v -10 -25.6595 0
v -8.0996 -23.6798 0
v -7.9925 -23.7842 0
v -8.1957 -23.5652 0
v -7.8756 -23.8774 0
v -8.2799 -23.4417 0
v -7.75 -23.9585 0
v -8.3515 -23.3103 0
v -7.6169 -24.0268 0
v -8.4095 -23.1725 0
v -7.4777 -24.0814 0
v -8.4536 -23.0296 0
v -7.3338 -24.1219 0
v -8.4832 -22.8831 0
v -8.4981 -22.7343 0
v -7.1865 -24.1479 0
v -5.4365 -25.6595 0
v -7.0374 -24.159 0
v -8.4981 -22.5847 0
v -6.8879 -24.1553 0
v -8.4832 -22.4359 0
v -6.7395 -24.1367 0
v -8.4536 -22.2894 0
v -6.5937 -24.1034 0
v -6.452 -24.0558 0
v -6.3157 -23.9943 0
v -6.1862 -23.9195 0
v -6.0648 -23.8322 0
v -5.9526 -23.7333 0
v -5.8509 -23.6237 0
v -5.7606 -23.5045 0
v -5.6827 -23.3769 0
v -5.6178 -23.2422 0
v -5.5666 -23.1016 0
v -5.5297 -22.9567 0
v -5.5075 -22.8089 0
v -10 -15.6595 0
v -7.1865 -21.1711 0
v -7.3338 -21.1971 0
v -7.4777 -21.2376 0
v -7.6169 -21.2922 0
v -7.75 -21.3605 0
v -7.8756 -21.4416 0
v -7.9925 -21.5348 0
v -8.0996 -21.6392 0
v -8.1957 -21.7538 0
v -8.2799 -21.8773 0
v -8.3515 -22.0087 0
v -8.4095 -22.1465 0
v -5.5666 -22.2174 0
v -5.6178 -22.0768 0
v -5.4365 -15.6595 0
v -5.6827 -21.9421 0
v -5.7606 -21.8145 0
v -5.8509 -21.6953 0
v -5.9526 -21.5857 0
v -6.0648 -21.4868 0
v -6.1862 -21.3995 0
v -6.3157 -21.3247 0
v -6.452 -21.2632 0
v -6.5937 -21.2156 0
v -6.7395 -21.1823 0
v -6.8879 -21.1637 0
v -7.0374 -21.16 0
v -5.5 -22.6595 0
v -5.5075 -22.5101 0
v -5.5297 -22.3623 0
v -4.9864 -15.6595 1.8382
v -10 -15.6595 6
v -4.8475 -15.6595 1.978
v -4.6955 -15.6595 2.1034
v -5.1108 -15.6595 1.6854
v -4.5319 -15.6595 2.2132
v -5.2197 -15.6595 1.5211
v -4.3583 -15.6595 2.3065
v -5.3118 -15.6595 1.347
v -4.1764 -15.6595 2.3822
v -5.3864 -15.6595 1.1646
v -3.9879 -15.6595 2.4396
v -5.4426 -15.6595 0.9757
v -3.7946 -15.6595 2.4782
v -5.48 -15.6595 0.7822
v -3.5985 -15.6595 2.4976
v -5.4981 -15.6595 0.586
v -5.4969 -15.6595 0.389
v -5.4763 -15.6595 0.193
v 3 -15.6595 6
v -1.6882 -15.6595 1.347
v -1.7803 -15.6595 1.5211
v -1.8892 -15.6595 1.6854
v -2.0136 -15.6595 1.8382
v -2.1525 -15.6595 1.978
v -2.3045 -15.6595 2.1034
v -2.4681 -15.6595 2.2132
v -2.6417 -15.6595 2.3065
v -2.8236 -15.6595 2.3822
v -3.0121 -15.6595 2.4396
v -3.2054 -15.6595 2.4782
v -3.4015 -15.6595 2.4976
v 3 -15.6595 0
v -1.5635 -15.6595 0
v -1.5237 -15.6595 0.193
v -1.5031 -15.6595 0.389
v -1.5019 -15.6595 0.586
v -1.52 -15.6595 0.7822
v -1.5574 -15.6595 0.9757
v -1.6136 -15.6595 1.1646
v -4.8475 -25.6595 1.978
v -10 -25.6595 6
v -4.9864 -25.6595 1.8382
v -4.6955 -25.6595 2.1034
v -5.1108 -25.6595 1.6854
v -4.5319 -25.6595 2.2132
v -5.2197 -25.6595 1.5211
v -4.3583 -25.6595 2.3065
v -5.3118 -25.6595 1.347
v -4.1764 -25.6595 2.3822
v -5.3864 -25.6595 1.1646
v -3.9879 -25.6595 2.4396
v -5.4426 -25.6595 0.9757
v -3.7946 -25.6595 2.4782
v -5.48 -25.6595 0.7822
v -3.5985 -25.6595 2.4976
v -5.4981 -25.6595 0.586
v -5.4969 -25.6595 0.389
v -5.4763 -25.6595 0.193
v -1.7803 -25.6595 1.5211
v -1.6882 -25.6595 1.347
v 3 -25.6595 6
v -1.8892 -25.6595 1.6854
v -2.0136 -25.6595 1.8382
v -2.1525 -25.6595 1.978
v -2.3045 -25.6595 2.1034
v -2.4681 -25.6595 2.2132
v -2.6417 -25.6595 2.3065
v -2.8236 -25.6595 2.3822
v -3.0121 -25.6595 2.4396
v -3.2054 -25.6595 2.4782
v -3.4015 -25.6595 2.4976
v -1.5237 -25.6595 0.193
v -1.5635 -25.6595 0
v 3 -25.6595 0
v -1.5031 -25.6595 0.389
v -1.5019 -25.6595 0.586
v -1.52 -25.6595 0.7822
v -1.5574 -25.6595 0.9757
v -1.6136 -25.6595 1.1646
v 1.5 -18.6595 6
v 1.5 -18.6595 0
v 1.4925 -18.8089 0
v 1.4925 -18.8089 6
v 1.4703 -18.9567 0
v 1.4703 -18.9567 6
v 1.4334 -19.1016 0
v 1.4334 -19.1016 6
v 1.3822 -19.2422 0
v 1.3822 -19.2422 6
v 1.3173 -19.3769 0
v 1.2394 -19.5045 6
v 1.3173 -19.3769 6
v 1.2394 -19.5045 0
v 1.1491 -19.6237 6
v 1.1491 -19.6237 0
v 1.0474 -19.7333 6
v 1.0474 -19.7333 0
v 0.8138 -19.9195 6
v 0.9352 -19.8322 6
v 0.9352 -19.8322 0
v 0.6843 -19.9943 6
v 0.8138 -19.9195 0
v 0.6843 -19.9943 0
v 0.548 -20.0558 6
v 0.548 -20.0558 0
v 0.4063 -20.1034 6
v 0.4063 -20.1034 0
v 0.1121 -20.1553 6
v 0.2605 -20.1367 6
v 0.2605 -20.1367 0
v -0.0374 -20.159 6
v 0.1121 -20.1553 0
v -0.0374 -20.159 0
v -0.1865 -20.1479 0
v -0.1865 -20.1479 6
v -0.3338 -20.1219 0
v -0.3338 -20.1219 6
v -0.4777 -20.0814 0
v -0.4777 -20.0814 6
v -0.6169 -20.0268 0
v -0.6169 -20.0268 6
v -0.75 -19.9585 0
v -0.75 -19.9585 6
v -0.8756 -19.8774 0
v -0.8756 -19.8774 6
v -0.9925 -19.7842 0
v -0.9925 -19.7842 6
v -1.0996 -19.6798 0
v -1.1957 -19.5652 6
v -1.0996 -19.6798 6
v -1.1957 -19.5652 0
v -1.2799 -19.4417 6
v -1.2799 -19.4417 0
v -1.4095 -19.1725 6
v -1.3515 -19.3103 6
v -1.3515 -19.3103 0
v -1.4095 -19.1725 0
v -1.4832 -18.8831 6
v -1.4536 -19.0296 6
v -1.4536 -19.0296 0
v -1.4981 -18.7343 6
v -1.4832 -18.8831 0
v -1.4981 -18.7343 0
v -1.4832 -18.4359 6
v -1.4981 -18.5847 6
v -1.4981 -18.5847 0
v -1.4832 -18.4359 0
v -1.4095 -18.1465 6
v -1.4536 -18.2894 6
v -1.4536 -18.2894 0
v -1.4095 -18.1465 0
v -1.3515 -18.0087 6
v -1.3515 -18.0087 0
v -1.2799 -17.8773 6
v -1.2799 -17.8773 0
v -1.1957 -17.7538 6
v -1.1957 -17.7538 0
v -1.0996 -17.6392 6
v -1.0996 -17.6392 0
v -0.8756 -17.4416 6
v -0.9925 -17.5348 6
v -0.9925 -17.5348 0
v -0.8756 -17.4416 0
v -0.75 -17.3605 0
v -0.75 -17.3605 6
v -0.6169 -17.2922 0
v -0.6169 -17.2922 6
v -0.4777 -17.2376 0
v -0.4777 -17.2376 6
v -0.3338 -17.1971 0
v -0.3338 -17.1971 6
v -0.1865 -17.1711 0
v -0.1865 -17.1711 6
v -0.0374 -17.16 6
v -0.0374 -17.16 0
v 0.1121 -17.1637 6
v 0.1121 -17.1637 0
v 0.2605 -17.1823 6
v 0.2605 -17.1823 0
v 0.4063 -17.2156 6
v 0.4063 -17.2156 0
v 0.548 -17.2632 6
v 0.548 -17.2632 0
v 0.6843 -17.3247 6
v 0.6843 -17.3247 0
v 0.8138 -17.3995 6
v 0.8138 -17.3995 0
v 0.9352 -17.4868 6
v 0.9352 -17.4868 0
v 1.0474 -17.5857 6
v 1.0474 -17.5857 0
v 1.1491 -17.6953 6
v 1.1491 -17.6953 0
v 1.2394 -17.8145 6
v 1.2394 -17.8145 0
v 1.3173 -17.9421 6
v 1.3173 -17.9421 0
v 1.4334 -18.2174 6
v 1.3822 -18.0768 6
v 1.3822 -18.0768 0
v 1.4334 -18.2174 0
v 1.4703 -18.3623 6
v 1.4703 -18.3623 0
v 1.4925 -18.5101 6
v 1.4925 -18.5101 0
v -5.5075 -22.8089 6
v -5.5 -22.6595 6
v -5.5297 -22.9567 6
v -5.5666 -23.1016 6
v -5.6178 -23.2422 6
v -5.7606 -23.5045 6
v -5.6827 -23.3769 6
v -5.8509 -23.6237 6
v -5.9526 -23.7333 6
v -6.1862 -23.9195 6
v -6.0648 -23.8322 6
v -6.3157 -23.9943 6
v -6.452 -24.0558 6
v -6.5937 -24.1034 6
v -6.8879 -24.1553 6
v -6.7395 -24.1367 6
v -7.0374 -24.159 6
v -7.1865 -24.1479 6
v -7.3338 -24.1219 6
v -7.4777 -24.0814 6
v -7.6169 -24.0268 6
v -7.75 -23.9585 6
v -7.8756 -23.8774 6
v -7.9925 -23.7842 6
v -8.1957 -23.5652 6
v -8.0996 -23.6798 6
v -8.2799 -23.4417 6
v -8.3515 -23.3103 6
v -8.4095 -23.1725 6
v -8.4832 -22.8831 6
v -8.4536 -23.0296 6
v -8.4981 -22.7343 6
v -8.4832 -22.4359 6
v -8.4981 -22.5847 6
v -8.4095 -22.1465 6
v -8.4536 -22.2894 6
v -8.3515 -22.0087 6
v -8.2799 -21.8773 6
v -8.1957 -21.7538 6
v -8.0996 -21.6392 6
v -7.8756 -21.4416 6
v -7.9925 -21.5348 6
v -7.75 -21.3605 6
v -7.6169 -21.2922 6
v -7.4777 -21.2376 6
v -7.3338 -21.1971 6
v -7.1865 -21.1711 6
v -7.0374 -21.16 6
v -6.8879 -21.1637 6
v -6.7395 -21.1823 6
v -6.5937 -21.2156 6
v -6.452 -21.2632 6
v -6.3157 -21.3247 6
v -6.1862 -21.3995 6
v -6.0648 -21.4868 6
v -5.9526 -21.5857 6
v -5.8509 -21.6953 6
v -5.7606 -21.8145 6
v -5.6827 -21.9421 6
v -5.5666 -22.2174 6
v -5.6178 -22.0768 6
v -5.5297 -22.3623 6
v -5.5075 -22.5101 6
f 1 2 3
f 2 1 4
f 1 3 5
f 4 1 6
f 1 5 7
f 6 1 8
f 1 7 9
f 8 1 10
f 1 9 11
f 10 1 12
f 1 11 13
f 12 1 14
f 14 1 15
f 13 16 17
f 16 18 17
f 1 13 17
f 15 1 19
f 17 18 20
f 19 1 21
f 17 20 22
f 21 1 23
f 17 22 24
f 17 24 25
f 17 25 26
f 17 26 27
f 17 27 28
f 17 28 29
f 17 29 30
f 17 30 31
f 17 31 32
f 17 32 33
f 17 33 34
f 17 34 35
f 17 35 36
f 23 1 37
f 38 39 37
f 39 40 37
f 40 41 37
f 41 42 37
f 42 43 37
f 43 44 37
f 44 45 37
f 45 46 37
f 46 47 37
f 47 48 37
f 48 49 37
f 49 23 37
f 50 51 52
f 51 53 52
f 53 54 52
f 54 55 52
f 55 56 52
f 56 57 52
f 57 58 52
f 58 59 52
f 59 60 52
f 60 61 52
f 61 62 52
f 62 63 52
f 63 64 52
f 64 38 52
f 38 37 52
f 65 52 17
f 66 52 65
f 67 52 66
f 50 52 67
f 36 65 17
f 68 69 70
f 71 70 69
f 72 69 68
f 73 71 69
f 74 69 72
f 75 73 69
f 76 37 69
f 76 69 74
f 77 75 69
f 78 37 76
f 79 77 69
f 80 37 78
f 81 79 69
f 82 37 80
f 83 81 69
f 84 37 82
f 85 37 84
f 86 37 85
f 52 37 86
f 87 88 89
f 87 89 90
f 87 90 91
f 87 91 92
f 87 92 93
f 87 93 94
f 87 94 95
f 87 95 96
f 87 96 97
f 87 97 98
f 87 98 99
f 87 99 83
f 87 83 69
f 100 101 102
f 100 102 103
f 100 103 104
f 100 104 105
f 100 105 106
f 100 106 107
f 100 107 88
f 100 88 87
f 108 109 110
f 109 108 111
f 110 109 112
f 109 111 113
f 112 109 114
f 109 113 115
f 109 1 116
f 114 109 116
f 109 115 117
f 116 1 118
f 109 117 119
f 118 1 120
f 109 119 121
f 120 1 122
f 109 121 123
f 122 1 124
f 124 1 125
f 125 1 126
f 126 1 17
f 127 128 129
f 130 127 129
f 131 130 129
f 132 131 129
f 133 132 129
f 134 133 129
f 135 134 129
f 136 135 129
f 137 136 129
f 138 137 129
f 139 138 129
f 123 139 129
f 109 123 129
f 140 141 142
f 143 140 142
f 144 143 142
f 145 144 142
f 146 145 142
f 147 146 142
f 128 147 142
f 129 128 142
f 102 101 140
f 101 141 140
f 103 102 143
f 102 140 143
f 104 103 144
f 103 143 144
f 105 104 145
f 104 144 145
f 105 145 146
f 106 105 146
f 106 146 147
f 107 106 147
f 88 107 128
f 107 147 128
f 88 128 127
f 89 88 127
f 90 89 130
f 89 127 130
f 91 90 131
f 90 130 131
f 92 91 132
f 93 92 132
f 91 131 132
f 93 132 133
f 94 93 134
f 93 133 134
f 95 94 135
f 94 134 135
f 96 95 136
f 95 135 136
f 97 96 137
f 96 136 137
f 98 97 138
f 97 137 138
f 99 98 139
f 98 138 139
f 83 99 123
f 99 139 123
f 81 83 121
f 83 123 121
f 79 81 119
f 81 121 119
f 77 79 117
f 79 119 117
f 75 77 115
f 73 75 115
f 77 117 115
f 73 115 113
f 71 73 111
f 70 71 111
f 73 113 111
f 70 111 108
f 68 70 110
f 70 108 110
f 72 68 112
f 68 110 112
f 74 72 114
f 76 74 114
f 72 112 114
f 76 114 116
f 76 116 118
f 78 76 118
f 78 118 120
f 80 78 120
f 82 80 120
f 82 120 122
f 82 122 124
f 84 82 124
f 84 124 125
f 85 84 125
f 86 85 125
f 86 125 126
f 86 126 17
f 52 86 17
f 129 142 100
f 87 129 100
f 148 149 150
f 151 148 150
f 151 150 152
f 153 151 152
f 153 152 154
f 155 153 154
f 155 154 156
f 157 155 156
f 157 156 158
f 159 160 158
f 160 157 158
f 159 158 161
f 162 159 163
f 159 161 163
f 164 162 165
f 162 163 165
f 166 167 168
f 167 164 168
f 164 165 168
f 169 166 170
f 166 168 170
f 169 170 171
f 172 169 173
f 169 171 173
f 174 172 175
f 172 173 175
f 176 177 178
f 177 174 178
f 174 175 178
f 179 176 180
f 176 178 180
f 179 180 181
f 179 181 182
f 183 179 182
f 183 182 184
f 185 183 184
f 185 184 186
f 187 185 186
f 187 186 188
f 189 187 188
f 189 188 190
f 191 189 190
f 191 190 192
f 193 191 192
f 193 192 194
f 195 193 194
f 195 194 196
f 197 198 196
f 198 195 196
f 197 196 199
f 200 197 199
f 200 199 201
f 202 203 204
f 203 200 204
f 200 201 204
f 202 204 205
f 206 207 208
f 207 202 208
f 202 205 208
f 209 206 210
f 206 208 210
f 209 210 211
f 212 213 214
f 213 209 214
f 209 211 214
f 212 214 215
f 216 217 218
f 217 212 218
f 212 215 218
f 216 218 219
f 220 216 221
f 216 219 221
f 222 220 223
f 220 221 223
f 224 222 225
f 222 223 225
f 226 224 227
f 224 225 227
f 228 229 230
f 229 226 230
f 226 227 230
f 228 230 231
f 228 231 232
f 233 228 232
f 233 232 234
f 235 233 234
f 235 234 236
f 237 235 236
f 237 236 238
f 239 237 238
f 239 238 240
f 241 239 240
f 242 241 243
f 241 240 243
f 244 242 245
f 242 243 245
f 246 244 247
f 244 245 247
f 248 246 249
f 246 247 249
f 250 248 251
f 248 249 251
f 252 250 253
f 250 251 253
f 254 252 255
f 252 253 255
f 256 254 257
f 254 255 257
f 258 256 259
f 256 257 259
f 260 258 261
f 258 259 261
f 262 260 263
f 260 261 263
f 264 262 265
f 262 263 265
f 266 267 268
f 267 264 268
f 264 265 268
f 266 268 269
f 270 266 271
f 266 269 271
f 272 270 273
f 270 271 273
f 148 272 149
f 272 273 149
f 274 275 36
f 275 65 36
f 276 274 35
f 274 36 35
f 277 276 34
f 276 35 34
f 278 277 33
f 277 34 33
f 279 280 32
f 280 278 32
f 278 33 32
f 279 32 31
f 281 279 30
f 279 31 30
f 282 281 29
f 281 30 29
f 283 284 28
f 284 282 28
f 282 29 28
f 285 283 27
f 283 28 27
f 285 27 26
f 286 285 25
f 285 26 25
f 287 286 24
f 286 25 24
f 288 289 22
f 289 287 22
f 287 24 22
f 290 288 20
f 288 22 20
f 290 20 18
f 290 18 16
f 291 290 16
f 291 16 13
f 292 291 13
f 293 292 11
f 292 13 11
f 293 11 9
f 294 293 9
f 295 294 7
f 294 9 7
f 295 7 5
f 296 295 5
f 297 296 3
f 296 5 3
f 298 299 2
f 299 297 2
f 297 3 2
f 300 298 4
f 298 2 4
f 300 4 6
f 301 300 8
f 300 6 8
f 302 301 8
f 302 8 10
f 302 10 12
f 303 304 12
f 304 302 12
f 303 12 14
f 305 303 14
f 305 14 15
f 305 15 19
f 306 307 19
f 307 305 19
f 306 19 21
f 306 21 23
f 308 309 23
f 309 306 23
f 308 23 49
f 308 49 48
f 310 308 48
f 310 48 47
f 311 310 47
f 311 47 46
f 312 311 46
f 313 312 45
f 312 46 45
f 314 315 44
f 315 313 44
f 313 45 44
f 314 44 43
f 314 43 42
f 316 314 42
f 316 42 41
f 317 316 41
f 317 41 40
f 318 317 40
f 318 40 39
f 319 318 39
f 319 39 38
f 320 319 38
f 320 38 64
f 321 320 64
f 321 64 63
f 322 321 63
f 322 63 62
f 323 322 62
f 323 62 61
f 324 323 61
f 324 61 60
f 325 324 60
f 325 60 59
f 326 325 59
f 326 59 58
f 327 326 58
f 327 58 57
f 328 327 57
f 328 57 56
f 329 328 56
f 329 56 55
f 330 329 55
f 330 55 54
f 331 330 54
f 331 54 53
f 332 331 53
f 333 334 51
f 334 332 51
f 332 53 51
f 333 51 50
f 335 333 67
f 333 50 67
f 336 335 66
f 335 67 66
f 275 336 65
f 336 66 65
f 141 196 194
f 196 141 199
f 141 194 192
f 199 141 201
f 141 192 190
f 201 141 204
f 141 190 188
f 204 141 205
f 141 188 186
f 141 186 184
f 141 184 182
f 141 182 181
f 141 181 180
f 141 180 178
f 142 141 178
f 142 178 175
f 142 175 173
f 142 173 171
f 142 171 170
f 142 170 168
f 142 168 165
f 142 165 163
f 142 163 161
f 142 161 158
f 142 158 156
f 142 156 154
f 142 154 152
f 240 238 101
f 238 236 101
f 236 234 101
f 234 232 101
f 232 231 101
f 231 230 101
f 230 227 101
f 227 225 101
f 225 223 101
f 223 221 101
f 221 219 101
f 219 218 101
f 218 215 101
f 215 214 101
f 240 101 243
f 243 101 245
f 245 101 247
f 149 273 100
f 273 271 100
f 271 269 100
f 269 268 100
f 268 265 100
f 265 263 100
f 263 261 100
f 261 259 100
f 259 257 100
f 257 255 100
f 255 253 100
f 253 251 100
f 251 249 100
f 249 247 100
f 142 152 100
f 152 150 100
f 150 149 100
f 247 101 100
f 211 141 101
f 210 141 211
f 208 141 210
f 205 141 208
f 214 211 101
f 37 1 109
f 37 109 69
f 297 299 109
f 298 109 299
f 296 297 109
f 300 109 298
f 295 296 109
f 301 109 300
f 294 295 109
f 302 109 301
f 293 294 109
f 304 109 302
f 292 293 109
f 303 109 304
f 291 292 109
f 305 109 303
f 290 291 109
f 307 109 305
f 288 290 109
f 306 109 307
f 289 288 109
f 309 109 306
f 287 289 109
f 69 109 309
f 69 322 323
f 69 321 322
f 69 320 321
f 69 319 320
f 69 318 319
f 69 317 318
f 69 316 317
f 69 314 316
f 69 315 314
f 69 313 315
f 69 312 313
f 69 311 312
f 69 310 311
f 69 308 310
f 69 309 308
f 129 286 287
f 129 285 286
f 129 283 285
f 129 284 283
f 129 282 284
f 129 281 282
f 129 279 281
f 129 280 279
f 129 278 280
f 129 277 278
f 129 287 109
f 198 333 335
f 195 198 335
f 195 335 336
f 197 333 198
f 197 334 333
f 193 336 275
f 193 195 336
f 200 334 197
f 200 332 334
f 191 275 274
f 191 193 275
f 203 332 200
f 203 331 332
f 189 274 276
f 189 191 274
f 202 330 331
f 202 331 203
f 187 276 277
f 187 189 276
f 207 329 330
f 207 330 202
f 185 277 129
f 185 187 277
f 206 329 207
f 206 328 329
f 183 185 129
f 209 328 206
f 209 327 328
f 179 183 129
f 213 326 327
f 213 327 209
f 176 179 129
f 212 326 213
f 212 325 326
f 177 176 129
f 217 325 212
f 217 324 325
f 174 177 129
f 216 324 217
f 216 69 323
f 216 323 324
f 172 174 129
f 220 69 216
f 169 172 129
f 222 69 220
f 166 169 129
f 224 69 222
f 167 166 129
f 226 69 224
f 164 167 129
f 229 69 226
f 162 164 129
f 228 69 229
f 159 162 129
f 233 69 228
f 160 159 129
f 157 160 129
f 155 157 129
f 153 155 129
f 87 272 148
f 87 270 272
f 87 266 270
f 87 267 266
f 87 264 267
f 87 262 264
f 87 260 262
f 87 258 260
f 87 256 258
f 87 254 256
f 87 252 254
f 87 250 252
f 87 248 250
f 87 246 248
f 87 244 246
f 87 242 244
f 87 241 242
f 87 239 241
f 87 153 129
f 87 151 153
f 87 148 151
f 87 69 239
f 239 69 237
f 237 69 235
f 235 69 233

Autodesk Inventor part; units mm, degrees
ref_plane "YZ Plane" through (0, 0, 0) normal (1, 0, 0) x (0, 1, 0)
ref_plane "XZ Plane" through (0, 0, 0) normal (0, 1, 0) x (-1, 0, 0)
ref_plane "XY Plane" through (0, 0, 0) normal (0, 0, 1) x (1, 0, 0)
sketch "Sketch1" plane through (0, 0, 0) normal (0, 0, 1) x (1, 0, 0)
  line L0 (-1.7679, 0.1299) -> (-1.7679, -25.6595) projected
  line L1 (-1.7679, -25.6595) -> (3, -25.6595) projected
  line L2 (3, -25.6595) -> (3, -15.6595) projected
  line L3 (3, -15.6595) -> (0, -15.6595) projected
  line L4 (0, -15.6595) -> (0, 0.1299) projected
  line L5 (-1.7679, 0.1299) -> (0, 0.1299) projected
  circle A0 centre (0, -18.6595) radius 1.5 projected
  line L6 (-5.2321, -25.6595) -> (-5.2321, 0.1299) projected
  line L7 (-10, 0.1299) -> (-5.2321, 0.1299) projected
  line L8 (-10, -25.6595) -> (-10, 0.1299) projected
  line L9 (-10, -25.6595) -> (-5.2321, -25.6595) projected
  circle A1 centre (-7, -22.6595) radius 1.5 projected
  line L10 (3, -25.6595) -> (-10, -25.6595)
  line L11 (-10, -25.6595) -> (-10, -15.6595)
  line L12 (-10, -15.6595) -> (3, -15.6595)
  line L13 (3, -15.6595) -> (3, -25.6595)
  point P0 (0, 0)
extrude "Extrusion1" add sketch "Sketch1" along normal blind 6 contours L12 L3 L2 L1 L0 | L0 L10 L6 L12 | L6 L9 L8 L12
sketch "Sketch2" plane through (-10, -25.6595, 0) normal (0, -1, 0) x (1, 0, 0)
  line L0 (0, 0) -> (13, 0) projected
  line L1 (13, 0) -> (13, 6) projected
  line L2 (0, 6) -> (13, 6) projected
  line L3 (0, 0) -> (0, 6) projected
  arc A0 (4.7679, 0) -> (8.2321, 0) centre (6.5, 1) ccw projected
  line L4 (0, 0) -> (4.7679, 0) projected
  line L5 (0, 0) -> (0, -4) projected
  line L6 (0, -4) -> (13, -4) projected
  line L7 (13, 0) -> (13, -4) projected
  line L8 (8.2321, 0) -> (13, 0) projected
  circle A1 centre (6.5, 0.5) radius 2
  point P0 (10, 0)
  dimension "d2" = 4
  dimension "d3" = 6.5
  dimension "d4" = 0.5
extrude "Extrusion2" cut sketch "Sketch2" against normal through all contours L0 A1 | A0 L0 A1
properties part number "eye_cam_clamp"
